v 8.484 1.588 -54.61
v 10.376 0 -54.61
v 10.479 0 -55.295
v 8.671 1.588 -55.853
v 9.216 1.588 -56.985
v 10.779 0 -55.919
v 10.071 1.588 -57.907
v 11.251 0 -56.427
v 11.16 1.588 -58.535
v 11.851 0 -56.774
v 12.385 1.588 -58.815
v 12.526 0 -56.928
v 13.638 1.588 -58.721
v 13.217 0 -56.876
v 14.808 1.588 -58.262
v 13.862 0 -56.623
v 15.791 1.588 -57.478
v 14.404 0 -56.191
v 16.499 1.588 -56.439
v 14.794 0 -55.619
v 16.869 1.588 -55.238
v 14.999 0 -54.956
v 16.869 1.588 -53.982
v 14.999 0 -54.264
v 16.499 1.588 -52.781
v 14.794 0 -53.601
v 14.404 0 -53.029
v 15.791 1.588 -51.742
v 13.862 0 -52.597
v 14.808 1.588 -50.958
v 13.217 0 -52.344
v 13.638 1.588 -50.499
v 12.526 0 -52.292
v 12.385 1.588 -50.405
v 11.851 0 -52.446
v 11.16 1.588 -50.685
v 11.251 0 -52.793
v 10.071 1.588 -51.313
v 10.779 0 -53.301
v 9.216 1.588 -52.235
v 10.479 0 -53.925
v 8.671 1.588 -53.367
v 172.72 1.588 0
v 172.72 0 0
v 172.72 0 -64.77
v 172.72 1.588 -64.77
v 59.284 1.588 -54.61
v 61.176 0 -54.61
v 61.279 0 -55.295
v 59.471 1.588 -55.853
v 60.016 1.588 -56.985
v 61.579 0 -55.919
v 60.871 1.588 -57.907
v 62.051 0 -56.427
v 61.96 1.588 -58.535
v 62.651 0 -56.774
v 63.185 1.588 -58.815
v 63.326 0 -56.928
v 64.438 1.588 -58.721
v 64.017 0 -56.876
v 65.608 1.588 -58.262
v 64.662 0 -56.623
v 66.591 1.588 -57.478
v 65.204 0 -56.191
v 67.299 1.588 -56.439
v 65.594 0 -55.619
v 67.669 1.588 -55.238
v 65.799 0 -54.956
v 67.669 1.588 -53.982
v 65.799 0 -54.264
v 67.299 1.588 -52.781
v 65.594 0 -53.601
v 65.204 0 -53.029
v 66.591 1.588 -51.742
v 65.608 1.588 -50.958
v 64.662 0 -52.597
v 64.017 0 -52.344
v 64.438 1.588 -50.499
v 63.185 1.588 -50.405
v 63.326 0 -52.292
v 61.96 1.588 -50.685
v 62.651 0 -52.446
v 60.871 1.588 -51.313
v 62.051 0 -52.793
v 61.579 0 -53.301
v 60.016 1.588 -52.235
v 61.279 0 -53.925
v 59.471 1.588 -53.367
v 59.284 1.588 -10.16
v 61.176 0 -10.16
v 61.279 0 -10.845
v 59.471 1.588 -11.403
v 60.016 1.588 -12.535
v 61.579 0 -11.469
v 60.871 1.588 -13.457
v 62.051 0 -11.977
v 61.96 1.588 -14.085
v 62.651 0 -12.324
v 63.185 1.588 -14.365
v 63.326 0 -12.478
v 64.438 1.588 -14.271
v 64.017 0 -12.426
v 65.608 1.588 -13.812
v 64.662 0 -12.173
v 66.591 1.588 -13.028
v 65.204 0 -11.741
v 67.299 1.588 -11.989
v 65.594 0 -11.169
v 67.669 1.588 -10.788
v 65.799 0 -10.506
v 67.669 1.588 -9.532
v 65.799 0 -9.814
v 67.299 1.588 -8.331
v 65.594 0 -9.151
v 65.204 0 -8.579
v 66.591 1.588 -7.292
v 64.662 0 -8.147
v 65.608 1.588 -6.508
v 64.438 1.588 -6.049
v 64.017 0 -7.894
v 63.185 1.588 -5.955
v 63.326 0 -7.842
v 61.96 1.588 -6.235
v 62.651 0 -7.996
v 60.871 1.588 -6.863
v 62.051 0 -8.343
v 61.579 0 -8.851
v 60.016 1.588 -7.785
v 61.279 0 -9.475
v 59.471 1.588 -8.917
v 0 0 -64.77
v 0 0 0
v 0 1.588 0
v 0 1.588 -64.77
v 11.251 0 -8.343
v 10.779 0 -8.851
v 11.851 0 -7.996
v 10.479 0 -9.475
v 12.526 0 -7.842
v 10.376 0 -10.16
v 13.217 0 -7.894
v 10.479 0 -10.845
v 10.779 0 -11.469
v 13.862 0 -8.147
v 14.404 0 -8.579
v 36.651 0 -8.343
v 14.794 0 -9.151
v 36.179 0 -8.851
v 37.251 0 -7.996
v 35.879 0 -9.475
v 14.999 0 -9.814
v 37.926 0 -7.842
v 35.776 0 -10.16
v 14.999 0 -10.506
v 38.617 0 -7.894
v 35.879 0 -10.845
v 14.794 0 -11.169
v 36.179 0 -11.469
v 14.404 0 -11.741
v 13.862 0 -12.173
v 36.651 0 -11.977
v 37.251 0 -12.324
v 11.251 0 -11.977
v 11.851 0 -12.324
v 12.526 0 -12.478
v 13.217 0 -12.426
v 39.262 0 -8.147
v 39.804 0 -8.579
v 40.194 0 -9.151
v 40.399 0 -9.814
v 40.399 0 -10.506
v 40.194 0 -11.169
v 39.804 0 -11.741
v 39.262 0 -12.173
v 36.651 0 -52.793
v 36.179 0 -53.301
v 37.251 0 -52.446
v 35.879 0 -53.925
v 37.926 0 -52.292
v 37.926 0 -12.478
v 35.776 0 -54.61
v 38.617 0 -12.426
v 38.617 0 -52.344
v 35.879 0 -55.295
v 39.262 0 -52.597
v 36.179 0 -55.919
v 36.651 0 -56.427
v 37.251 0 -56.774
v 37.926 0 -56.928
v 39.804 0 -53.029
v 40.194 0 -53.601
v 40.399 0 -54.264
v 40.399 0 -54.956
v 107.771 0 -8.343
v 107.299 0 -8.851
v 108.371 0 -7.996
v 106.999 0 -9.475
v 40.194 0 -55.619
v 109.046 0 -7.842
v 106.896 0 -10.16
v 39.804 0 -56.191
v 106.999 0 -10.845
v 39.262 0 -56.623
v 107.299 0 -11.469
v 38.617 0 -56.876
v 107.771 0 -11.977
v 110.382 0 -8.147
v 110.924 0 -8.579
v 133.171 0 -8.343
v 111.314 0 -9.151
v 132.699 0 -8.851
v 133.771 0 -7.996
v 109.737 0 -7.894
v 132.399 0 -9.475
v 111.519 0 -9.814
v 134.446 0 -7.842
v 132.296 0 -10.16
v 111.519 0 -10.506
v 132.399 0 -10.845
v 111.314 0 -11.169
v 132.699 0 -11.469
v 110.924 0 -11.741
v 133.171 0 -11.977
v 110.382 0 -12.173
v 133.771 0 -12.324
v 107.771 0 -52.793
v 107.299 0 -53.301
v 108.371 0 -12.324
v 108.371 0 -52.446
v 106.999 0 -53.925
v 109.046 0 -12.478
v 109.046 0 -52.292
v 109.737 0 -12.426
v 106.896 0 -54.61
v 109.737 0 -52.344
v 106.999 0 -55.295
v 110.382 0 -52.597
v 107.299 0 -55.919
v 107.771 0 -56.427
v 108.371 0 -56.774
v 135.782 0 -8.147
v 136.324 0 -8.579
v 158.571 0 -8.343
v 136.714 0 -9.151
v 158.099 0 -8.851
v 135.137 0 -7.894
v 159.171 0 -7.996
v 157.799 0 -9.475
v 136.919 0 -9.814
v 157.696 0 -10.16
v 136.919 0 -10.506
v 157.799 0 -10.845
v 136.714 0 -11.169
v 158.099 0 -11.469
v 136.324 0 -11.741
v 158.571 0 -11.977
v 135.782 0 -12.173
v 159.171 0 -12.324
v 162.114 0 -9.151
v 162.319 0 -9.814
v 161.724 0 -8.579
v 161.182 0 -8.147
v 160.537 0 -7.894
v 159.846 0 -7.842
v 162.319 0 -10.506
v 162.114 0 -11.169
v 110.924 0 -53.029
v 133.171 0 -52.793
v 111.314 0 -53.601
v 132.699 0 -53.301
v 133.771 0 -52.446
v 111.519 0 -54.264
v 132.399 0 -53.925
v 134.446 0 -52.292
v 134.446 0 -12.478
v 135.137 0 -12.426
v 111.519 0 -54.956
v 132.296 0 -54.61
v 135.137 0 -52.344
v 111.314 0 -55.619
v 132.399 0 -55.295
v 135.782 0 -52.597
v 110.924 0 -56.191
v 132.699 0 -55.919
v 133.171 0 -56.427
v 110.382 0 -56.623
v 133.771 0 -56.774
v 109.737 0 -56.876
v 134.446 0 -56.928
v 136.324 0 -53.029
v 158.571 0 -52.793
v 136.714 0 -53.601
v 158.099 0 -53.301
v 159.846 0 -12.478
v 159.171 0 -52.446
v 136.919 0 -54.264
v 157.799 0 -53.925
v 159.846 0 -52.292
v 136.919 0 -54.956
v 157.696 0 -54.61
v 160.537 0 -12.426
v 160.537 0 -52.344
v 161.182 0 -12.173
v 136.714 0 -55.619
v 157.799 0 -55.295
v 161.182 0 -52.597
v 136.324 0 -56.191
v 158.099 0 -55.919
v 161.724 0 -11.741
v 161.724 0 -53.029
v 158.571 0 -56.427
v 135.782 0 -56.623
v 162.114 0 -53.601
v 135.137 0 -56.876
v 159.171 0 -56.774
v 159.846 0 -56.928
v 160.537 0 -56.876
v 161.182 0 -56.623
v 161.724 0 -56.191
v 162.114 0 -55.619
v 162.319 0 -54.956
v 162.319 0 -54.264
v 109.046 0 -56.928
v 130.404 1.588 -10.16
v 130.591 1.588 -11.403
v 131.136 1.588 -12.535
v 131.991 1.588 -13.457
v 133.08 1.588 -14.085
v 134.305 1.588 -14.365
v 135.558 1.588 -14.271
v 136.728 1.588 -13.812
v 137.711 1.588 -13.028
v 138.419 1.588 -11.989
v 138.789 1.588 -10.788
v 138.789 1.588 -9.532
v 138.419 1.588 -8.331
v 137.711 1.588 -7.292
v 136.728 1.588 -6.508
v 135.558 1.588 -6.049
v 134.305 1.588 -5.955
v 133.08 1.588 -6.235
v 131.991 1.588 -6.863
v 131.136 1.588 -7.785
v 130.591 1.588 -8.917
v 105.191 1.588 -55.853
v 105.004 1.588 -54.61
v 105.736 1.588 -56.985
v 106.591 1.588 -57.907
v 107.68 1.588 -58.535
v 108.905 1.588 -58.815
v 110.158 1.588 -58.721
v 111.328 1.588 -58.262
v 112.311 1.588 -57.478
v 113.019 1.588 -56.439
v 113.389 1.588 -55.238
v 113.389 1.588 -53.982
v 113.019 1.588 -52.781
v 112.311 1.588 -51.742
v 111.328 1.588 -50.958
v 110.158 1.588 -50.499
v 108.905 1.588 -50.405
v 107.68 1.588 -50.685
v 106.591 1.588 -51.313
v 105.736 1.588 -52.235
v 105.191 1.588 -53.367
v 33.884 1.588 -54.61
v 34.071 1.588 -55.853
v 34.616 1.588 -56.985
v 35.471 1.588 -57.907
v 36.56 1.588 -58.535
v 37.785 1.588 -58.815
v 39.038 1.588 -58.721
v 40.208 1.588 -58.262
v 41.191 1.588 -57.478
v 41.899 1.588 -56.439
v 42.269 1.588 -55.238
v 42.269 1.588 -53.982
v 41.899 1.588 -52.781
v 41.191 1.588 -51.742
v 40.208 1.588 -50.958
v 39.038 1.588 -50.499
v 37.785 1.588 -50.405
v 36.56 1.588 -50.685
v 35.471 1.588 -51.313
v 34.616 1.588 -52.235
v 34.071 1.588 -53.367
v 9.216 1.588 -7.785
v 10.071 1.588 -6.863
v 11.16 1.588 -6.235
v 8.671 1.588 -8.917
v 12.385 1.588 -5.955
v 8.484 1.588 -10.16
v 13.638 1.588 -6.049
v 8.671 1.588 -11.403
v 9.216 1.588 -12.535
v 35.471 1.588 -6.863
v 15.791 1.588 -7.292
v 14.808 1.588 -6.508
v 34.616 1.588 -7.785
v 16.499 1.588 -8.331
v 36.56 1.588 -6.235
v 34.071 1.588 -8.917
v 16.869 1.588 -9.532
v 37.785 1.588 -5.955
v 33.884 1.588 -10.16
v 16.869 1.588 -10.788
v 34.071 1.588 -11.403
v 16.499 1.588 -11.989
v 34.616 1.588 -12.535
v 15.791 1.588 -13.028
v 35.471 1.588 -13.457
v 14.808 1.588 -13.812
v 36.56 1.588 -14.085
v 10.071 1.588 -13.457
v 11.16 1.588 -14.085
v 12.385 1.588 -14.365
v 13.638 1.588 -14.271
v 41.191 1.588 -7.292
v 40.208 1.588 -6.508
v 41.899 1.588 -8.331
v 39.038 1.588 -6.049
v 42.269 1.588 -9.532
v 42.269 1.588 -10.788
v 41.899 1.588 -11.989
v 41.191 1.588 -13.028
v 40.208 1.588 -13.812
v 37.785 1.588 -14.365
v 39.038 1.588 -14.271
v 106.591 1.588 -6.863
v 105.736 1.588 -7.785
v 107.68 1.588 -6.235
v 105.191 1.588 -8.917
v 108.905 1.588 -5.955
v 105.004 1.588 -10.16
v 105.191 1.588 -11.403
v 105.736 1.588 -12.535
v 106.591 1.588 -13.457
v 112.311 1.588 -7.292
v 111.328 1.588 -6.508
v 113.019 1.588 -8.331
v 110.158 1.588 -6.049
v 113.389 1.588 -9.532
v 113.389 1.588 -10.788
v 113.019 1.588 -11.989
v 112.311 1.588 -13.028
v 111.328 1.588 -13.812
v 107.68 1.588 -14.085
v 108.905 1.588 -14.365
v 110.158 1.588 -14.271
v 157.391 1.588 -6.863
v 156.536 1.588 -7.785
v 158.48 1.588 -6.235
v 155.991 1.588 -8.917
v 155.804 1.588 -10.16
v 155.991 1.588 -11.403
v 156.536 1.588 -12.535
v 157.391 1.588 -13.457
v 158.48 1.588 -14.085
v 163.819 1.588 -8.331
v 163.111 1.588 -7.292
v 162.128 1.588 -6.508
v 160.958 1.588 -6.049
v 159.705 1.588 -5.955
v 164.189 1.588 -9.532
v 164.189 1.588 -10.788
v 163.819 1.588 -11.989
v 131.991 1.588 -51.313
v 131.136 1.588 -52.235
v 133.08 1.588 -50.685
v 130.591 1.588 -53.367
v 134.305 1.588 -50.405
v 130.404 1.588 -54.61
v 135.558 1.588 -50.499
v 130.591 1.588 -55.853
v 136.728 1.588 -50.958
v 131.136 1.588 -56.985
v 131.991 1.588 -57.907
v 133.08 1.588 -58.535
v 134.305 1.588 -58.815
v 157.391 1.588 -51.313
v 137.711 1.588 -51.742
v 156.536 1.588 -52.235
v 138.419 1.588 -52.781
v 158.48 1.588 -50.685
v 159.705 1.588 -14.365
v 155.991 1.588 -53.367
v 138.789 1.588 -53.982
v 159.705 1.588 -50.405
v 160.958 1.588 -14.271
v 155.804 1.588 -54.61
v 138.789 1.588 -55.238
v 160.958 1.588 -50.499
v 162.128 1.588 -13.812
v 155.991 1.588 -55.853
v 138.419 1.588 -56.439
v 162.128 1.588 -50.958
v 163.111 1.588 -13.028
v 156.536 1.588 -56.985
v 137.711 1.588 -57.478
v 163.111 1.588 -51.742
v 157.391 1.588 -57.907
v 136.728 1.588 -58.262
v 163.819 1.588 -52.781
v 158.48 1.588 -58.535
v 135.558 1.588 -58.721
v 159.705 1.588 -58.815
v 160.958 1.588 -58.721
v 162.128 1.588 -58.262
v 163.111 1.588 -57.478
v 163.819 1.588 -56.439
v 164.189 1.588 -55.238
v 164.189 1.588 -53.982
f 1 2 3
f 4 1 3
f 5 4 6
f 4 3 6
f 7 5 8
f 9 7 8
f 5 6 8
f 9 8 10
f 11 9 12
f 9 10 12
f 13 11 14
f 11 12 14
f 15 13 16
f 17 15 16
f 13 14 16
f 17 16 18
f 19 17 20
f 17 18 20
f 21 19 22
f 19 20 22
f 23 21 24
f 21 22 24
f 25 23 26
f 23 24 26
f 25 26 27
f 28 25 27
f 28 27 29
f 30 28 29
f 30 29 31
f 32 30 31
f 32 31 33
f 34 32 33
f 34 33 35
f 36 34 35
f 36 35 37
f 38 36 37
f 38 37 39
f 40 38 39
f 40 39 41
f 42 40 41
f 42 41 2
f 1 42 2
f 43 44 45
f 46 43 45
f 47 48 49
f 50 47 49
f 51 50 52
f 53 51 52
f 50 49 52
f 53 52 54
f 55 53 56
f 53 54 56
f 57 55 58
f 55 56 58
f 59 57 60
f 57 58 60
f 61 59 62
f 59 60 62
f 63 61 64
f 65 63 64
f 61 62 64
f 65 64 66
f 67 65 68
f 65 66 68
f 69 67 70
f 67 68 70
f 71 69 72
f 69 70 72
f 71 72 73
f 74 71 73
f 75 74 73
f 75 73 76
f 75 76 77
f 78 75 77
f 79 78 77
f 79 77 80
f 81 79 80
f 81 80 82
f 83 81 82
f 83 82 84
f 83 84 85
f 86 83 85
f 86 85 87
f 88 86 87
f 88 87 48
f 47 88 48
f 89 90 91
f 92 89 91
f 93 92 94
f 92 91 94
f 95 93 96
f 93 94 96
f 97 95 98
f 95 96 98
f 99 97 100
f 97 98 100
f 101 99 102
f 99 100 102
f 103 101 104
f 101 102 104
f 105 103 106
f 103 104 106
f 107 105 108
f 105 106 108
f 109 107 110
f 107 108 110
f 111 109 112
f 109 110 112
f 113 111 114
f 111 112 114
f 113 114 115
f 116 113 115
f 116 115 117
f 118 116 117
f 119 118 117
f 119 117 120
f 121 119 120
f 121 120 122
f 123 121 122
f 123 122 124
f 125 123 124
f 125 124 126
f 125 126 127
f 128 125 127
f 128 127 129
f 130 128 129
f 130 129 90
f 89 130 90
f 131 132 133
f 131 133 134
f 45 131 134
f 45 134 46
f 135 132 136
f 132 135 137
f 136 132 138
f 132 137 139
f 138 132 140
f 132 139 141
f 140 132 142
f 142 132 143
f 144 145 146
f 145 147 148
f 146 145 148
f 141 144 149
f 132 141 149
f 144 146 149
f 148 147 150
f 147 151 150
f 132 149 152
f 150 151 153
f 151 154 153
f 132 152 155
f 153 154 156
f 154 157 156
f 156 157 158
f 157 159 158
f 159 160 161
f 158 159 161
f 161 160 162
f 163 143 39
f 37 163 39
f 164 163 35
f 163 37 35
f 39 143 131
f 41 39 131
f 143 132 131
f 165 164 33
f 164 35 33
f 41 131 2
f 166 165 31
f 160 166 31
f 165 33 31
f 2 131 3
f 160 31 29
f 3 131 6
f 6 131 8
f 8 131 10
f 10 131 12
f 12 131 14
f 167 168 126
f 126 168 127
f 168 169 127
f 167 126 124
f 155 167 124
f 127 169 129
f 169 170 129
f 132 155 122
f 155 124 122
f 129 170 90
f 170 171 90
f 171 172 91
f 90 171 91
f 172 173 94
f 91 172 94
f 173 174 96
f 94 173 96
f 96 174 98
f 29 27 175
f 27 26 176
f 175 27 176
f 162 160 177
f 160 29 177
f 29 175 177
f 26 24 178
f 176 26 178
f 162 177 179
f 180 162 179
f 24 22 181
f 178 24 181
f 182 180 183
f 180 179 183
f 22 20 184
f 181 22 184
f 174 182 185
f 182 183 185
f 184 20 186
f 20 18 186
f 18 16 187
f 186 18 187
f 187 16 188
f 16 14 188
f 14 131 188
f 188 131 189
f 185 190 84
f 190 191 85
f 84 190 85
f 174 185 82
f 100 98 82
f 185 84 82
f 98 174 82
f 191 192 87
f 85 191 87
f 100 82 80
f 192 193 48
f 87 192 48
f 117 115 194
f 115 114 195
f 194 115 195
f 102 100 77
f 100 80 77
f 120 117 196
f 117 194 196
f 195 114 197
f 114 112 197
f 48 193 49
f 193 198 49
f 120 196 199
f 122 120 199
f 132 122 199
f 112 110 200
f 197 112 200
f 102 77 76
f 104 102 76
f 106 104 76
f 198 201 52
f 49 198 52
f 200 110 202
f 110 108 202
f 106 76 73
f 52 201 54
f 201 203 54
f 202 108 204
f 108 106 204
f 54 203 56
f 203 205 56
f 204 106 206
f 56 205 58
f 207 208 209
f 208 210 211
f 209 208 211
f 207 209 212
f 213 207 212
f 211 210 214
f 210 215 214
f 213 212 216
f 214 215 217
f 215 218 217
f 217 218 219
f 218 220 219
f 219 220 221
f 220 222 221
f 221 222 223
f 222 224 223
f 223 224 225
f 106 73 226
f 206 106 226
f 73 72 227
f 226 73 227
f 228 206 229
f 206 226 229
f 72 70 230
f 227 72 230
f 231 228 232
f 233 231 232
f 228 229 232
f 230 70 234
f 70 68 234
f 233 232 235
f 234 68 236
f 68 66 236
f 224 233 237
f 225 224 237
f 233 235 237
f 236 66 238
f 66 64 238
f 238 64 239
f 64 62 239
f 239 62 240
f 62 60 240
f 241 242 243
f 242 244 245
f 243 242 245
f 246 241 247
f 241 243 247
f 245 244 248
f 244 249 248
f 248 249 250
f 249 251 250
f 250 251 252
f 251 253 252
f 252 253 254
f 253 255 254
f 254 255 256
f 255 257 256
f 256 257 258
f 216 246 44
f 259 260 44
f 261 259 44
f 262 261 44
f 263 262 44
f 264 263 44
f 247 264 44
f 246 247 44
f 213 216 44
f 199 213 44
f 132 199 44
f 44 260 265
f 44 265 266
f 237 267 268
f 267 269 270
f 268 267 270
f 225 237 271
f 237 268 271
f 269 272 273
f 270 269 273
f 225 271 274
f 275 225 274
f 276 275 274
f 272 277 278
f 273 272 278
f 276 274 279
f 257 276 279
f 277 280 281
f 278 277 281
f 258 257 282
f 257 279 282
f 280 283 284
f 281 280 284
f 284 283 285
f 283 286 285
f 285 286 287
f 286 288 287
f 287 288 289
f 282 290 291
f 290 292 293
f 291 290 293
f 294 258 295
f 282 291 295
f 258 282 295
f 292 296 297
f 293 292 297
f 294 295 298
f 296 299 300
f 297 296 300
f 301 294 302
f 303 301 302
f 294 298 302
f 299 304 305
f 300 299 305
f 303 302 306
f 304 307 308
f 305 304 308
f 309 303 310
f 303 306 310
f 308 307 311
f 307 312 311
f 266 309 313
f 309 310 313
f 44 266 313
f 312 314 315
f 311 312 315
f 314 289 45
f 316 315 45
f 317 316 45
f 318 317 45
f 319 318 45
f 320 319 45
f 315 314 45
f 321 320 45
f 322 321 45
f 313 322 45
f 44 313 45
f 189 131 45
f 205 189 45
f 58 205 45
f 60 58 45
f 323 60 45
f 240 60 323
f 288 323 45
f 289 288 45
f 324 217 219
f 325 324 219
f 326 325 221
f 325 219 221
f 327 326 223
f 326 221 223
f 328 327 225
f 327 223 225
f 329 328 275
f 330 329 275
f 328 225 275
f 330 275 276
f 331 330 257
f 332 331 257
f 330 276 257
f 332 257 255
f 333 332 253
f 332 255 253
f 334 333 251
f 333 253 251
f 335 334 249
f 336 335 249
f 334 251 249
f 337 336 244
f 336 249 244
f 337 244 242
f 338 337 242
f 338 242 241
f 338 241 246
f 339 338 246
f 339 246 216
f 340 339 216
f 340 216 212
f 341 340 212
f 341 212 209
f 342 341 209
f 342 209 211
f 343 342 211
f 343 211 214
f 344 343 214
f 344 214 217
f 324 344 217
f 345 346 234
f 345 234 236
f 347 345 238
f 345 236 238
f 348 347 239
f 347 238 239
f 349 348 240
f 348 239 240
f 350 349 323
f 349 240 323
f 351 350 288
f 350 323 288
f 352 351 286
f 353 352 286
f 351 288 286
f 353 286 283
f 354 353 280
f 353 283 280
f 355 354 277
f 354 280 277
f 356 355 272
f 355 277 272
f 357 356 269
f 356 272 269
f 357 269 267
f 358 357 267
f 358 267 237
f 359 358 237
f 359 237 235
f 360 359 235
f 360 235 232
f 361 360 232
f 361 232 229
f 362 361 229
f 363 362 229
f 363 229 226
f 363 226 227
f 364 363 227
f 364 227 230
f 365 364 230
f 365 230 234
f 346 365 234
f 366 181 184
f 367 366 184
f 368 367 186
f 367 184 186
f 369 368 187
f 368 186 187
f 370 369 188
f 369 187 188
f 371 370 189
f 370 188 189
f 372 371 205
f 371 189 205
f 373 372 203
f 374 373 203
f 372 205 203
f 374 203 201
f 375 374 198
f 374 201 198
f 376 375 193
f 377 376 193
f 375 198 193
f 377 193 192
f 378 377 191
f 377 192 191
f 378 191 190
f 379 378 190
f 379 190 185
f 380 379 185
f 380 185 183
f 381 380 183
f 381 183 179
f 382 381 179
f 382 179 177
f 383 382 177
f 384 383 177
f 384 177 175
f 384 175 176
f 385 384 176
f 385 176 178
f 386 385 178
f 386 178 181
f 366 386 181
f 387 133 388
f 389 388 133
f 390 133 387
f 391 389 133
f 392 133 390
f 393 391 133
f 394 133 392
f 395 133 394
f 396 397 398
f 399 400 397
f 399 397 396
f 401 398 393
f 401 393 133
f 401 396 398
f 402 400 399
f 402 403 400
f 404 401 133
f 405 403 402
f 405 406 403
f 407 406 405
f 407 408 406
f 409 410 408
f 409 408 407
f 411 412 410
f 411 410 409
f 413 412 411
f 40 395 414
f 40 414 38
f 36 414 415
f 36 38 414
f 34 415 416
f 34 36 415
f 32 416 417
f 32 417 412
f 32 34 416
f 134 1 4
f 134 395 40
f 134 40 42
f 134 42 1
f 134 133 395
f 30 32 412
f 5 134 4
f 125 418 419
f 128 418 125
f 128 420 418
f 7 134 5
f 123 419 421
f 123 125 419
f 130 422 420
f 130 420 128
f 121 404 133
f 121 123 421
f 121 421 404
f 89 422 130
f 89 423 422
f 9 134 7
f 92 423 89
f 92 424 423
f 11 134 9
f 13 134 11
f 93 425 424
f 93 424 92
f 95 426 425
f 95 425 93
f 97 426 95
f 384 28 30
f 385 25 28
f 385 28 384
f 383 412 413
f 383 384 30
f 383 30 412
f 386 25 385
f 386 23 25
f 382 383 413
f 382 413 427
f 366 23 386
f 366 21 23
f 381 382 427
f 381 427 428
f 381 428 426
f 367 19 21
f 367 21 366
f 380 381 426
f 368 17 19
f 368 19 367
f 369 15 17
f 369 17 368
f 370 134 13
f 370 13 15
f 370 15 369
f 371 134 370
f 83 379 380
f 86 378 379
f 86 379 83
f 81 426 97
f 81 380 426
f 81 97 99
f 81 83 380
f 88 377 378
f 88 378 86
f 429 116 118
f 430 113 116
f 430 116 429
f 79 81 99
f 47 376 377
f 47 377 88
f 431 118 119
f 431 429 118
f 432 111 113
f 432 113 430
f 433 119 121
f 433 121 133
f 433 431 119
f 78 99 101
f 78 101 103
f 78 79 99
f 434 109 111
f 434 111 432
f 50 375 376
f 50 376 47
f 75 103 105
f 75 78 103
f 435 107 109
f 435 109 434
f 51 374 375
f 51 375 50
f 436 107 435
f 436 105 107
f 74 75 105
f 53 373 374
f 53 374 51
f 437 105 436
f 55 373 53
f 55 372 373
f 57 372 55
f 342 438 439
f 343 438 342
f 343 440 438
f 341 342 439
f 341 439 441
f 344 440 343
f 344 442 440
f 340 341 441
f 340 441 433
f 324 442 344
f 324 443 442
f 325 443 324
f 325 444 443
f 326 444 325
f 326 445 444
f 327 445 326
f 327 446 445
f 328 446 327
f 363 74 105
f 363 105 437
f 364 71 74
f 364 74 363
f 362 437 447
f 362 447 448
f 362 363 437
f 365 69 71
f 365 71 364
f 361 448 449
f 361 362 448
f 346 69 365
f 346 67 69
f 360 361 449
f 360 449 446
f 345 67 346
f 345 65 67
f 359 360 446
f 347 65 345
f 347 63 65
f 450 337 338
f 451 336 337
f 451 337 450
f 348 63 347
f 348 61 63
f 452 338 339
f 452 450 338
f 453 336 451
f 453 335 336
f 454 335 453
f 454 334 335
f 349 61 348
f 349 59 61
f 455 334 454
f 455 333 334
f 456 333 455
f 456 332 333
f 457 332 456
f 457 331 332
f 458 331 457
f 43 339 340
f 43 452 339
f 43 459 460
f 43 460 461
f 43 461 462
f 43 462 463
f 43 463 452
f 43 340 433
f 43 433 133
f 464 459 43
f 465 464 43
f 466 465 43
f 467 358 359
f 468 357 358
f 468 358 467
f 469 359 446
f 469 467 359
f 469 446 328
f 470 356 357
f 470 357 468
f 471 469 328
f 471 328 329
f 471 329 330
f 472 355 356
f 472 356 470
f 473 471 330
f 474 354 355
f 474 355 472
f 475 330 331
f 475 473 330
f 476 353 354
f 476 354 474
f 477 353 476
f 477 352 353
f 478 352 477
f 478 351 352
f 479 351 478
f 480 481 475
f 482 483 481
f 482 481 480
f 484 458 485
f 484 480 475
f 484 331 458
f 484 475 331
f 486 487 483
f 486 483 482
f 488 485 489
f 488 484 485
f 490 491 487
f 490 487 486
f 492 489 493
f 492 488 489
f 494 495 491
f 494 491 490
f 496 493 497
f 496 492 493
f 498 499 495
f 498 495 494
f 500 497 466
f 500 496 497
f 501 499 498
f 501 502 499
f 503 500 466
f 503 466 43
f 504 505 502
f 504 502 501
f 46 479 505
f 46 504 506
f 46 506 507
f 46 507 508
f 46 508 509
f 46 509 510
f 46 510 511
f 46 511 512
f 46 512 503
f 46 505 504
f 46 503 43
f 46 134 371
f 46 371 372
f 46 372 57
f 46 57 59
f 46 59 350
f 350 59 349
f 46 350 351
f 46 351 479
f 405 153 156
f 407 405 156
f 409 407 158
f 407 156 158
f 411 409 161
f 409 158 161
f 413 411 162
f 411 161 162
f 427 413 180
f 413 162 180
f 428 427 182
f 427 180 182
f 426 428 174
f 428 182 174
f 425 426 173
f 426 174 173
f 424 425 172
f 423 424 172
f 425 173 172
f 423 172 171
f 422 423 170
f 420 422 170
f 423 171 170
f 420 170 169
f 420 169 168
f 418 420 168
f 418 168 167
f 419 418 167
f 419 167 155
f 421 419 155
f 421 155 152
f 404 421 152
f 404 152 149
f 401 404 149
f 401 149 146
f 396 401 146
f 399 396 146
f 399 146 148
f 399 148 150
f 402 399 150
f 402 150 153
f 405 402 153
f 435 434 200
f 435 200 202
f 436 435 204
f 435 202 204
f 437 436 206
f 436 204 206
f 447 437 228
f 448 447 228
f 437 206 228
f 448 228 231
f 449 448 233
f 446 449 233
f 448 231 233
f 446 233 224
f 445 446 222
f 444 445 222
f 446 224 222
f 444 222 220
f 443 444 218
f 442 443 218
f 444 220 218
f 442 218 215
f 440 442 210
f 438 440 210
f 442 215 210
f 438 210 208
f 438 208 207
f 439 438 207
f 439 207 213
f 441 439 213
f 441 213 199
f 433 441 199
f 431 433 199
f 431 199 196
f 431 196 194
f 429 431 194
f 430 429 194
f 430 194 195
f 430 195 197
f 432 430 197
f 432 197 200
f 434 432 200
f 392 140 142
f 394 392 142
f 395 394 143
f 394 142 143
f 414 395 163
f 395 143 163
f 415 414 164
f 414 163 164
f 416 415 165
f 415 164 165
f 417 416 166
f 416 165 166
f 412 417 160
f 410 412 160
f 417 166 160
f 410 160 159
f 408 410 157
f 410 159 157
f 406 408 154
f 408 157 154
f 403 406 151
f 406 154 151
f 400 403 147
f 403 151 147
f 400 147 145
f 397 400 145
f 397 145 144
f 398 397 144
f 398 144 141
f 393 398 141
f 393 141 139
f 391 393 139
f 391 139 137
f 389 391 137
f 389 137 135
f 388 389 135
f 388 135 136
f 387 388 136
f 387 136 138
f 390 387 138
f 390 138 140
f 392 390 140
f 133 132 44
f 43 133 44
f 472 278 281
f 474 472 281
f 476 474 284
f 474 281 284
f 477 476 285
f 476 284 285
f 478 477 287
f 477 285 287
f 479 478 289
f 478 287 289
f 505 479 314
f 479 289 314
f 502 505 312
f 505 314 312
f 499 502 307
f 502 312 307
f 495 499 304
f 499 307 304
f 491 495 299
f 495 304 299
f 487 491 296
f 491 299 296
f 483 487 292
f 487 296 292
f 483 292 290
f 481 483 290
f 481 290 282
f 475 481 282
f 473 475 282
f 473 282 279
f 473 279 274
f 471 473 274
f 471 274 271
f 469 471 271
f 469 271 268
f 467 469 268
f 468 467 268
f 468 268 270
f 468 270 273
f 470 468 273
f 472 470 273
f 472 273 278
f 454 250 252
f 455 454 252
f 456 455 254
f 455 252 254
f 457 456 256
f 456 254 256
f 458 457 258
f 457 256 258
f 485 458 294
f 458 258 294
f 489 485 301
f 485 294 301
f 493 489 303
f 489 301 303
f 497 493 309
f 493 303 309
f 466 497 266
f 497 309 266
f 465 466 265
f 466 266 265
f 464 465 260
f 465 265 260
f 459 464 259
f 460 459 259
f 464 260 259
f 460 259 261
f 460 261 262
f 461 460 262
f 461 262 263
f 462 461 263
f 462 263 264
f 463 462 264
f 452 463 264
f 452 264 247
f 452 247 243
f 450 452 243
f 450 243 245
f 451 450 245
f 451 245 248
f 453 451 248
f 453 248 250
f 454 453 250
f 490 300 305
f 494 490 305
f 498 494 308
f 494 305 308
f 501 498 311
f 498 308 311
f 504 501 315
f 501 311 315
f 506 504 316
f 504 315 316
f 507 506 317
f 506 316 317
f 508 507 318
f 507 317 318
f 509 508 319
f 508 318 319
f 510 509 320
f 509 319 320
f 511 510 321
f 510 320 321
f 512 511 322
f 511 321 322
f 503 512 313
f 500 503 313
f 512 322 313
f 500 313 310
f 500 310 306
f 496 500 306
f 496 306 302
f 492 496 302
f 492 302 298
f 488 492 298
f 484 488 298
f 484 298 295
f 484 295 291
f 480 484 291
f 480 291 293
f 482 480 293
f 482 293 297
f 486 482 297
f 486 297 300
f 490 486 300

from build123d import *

# Parameters (mm, degrees)
SKETCH1_W                                         = 172.72
SKETCH1_H                                         = 64.77
BOSS_EXTRUDE1_DEPTH                               = 1.5875
CSK_FOR_8_FLAT_HEAD_MACHINE_SCREW_100_D           = 4.4958
CSK_FOR_8_FLAT_HEAD_MACHINE_SCREW_100_DEPTH       = 12.7
CSK_FOR_8_FLAT_HEAD_MACHINE_SCREW_100_CSINK_D     = 8.4328
CSK_FOR_8_FLAT_HEAD_MACHINE_SCREW_100_CSINK_ANGLE = 100
CSK_FOR_8_FLAT_HEAD_MACHINE_SCREW_100_TIP         = 1.350674586


with BuildPart() as part:
    # Sketch1 → Boss-Extrude1 (new body)
    with BuildSketch(Plane(origin=(0, 0, 0), x_dir=(1, 0, 0), z_dir=(0, 1, 0))):
        with Locations((86.36, 32.385)):
            Rectangle(SKETCH1_W, SKETCH1_H)
    extrude(amount=BOSS_EXTRUDE1_DEPTH)

    # CSK for #8 Flat Head Machine Screw (100)1
    with Locations(Plane(origin=(0, 1.5875, 0), x_dir=(1, 0, 0), z_dir=(0, 1, 0))):
        with Locations((12.7, 54.61), (38.1, 54.61), (63.5, 54.61), (109.22, 54.61), (134.62, 54.61), (160.02, 54.61), (160.02, 10.16), (134.62, 10.16), (109.22, 10.16), (63.5, 10.16), (38.1, 10.16), (12.7, 10.16)):
            CounterSinkHole(CSK_FOR_8_FLAT_HEAD_MACHINE_SCREW_100_D / 2, CSK_FOR_8_FLAT_HEAD_MACHINE_SCREW_100_CSINK_D / 2, depth=CSK_FOR_8_FLAT_HEAD_MACHINE_SCREW_100_DEPTH, counter_sink_angle=CSK_FOR_8_FLAT_HEAD_MACHINE_SCREW_100_CSINK_ANGLE)
            with Locations((0, 0, -(CSK_FOR_8_FLAT_HEAD_MACHINE_SCREW_100_DEPTH + CSK_FOR_8_FLAT_HEAD_MACHINE_SCREW_100_TIP / 2))):  # 118° drill point
                Cone(0, CSK_FOR_8_FLAT_HEAD_MACHINE_SCREW_100_D / 2, CSK_FOR_8_FLAT_HEAD_MACHINE_SCREW_100_TIP, mode=Mode.SUBTRACT)


solid = part.part
